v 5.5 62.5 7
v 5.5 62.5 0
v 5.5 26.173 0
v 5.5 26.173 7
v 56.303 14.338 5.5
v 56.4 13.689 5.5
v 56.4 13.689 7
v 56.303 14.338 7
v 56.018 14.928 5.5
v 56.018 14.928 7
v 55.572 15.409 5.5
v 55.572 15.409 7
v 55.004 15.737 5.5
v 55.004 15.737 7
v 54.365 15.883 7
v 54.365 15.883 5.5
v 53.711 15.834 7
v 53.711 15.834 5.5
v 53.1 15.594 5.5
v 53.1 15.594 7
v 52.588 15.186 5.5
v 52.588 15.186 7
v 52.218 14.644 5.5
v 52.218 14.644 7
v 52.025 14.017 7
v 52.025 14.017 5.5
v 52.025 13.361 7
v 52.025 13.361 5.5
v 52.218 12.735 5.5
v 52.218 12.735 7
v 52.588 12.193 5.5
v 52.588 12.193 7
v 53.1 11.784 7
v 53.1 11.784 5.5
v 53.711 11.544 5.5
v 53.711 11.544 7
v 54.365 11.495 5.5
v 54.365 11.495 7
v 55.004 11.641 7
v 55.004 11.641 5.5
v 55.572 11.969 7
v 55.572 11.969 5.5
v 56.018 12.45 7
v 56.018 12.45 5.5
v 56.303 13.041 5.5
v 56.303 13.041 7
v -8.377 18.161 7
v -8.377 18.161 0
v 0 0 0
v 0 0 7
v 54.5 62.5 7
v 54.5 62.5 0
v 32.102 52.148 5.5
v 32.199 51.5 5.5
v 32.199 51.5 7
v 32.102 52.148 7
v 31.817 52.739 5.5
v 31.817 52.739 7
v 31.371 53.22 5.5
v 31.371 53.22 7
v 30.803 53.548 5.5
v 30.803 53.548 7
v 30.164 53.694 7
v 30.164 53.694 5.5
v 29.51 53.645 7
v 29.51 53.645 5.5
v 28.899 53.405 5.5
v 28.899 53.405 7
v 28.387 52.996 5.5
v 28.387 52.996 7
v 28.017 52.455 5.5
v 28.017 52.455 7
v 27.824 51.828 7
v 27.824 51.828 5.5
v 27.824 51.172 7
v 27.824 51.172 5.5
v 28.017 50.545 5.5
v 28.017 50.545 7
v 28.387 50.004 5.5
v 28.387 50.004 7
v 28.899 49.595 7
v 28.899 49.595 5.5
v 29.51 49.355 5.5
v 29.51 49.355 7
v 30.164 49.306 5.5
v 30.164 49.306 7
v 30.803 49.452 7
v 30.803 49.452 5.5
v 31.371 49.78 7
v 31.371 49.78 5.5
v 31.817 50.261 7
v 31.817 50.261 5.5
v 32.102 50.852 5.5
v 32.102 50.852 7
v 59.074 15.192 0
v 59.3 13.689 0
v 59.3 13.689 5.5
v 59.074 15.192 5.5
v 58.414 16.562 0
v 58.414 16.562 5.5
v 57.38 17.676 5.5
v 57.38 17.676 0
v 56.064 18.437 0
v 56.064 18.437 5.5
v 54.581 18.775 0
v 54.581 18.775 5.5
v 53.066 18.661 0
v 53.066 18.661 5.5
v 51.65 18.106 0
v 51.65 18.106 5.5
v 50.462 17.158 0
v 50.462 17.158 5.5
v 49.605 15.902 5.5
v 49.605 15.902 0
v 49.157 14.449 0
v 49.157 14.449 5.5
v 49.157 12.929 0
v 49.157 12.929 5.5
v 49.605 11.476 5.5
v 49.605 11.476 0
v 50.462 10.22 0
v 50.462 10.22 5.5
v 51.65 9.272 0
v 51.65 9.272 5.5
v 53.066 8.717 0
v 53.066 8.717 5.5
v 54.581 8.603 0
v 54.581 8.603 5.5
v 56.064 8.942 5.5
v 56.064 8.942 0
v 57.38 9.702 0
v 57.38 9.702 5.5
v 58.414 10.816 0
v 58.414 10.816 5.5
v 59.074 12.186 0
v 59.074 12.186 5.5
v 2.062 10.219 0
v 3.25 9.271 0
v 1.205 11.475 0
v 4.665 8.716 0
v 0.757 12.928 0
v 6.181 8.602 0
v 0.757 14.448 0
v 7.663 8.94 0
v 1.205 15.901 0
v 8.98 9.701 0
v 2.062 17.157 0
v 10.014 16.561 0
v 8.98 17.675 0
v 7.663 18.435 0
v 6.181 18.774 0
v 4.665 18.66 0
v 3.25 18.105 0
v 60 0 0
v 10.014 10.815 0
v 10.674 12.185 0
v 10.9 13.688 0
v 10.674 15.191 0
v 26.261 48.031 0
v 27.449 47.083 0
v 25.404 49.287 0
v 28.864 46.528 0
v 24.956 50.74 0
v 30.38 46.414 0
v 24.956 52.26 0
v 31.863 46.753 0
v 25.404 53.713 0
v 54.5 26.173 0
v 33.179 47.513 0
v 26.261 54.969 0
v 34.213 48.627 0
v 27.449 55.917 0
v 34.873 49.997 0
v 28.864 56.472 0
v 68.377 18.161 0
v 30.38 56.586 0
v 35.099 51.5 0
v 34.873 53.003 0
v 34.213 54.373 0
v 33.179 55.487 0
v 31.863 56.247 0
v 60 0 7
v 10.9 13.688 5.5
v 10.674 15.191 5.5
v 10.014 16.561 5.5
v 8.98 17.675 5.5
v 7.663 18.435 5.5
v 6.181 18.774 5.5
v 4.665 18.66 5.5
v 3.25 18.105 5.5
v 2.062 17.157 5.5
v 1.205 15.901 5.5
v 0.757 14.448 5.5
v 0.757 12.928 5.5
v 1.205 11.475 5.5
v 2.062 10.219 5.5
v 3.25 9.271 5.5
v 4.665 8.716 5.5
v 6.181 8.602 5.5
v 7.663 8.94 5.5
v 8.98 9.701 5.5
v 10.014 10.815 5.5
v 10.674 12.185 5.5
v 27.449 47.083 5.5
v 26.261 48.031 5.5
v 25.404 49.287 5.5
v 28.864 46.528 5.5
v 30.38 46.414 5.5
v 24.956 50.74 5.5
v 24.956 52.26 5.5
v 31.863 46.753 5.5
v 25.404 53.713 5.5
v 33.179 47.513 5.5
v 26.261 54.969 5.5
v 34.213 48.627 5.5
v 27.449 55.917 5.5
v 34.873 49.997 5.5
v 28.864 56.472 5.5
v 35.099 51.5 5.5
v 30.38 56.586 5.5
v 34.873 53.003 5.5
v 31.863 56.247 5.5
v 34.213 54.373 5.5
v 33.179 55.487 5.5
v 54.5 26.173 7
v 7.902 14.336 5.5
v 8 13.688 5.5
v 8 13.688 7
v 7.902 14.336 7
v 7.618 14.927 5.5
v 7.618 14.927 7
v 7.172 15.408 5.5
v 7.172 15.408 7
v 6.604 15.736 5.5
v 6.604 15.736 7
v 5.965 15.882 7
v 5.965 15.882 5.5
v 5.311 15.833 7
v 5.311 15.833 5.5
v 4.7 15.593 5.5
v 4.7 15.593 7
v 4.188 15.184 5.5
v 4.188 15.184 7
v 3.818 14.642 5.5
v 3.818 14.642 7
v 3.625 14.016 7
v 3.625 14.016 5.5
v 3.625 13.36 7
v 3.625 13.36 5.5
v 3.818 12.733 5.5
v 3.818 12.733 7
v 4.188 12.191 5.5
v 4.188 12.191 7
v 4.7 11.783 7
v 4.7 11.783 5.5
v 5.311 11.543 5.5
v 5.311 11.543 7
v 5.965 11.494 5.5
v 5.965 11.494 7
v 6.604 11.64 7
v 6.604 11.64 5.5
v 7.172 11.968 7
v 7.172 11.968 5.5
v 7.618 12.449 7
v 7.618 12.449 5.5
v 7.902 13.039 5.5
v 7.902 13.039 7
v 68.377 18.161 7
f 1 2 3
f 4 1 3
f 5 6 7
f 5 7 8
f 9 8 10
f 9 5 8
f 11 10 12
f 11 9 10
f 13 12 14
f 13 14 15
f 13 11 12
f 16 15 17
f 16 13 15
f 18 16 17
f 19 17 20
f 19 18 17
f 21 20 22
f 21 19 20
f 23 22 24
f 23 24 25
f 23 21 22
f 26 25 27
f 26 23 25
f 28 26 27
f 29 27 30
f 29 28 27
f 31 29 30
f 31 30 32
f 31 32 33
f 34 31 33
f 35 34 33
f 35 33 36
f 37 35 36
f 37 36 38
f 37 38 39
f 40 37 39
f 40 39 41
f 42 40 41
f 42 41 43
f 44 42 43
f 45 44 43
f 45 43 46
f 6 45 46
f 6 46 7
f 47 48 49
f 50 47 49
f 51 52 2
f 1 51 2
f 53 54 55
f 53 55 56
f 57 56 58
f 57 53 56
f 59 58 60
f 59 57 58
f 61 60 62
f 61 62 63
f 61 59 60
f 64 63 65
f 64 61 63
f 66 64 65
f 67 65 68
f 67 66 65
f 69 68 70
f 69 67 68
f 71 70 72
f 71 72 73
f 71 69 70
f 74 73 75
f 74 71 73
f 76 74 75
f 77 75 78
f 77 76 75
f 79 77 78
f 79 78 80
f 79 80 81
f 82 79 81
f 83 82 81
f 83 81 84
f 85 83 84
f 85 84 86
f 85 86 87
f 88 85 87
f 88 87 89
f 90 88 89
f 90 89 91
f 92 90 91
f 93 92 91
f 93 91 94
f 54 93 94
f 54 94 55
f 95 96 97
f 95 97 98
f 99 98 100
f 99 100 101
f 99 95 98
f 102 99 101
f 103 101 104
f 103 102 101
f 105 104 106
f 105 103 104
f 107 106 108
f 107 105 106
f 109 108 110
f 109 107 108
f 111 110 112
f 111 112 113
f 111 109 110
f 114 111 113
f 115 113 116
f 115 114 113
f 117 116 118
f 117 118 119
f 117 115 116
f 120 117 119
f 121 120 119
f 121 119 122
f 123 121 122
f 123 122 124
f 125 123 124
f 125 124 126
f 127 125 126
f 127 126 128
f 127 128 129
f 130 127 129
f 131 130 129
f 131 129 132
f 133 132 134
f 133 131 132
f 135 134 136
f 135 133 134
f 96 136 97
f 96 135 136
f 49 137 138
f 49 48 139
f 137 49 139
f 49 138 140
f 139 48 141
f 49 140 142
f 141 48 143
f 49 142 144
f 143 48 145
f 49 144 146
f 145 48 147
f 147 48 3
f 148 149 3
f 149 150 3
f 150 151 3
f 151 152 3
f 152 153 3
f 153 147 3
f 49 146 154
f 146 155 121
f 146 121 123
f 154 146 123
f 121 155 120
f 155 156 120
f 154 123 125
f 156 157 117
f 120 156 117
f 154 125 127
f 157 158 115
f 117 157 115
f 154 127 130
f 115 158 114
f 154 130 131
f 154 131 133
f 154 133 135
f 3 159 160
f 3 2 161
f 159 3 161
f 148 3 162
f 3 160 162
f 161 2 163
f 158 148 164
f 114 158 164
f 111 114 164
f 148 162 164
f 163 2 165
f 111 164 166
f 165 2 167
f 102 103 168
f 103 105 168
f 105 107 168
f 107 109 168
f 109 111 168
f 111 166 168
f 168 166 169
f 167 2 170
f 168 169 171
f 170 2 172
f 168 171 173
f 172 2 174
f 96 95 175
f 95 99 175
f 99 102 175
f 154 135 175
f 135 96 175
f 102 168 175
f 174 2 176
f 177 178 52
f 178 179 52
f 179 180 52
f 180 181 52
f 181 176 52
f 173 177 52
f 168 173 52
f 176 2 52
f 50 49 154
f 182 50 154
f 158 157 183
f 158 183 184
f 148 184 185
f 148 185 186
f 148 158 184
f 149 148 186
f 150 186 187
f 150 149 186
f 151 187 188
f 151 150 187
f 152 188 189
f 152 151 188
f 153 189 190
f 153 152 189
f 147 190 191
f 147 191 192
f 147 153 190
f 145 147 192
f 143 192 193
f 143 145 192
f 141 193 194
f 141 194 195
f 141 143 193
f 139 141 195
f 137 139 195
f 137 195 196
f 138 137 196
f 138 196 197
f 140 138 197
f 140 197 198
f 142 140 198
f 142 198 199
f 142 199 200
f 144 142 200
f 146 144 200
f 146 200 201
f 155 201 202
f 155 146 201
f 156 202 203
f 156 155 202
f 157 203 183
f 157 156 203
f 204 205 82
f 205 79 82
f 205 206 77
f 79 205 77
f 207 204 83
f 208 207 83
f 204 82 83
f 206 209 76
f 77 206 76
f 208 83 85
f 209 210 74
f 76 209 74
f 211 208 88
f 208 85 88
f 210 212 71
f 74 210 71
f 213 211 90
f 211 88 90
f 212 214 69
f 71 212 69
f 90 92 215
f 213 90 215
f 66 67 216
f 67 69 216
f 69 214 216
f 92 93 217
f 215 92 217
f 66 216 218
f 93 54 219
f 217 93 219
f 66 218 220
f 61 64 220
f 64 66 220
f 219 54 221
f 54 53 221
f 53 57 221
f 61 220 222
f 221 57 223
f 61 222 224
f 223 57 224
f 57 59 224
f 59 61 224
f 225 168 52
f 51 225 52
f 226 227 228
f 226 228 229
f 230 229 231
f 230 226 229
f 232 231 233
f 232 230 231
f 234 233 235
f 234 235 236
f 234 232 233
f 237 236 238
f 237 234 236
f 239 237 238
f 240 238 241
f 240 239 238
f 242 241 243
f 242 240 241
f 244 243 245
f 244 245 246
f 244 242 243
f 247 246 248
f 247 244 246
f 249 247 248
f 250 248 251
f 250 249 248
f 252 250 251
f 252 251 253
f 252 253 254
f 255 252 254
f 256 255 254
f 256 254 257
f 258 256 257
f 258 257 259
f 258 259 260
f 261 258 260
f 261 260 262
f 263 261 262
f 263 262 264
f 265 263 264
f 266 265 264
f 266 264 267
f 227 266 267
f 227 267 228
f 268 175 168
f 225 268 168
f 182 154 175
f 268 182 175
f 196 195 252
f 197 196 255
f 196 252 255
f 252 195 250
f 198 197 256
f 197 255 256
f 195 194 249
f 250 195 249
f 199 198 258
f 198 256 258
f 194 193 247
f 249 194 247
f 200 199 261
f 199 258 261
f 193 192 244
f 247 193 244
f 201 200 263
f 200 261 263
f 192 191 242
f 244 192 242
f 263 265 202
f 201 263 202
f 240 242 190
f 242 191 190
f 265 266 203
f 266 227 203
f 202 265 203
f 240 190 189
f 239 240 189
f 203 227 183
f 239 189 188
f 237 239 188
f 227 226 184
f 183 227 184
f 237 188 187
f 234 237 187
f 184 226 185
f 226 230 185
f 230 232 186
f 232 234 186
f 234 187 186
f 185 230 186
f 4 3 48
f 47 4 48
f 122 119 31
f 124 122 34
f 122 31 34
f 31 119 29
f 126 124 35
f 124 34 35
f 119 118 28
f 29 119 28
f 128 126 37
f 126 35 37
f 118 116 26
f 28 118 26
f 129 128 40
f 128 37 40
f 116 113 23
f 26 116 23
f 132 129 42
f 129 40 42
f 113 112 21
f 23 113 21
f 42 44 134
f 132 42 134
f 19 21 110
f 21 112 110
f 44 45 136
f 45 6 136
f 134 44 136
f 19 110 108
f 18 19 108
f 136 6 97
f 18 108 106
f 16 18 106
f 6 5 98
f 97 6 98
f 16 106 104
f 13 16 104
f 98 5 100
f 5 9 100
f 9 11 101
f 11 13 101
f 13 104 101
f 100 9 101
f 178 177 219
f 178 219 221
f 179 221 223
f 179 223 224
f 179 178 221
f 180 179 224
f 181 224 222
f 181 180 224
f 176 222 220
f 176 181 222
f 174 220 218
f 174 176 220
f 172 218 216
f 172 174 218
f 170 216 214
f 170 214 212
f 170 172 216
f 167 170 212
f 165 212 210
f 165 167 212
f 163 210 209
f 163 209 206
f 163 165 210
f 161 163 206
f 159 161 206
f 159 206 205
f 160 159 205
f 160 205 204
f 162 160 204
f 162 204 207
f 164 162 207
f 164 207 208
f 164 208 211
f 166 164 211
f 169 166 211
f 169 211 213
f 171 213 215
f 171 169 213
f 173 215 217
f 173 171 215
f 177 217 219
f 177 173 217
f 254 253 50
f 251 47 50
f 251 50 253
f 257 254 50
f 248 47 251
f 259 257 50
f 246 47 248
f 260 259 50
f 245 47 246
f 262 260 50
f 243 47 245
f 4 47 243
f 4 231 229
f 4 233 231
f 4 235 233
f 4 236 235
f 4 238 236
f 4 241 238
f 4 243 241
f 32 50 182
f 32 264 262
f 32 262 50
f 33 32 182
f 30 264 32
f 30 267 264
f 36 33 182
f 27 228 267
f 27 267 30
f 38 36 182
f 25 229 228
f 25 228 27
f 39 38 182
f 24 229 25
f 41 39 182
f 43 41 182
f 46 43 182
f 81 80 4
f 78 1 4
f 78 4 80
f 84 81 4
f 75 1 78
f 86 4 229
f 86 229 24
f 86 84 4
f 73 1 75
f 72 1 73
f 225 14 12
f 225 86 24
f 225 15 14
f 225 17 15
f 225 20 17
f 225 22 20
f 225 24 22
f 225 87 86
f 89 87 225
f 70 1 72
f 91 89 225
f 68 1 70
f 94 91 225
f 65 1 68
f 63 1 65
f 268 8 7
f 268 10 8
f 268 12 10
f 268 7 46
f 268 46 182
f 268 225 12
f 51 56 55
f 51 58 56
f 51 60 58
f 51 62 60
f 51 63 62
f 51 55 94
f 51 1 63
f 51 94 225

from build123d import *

# Parameters (mm, degrees)
SKETCH1_R           = 5.1
SKETCH1_R_2         = 2.2
BOSS_EXTRUDE1_DEPTH = 7
SKETCH1_3_R         = 5.1
SKETCH1_3_R_2       = 2.2
CUT_EXTRUDE1_DEPTH  = 5.5
SKETCH1_4_R         = 2.2
CUT_EXTRUDE2_DEPTH  = 7


with BuildPart() as part:
    # Sketch1 → Boss-Extrude1 (new body)
    with BuildSketch(Plane.XY):
        Polygon((54.5, 26.172980381), (54.5, 62.5), (5.5, 62.5), (5.5, 26.172980381), (-8.376844495, 18.161180477), (0, 0), (60, 0), (68.376844495, 18.161180477), align=None)
        with Locations((29.999295859, 51.499999991)):
            Circle(SKETCH1_R, mode=Mode.SUBTRACT)
        with Locations((5.800227015, 13.687854711)):
            Circle(SKETCH1_R, mode=Mode.SUBTRACT)
        with Locations((54.200362799, 13.689133529)):
            Circle(SKETCH1_R, mode=Mode.SUBTRACT)
        with Locations((5.800227015, 13.687854711)):
            Circle(SKETCH1_R)
        with Locations((5.800227015, 13.687854711)):
            Circle(SKETCH1_R_2, mode=Mode.SUBTRACT)
        with Locations((5.800227015, 13.687854711)):
            Circle(SKETCH1_R_2)
        with Locations((54.200362799, 13.689133529)):
            Circle(SKETCH1_R)
        with Locations((54.200362799, 13.689133529)):
            Circle(SKETCH1_R_2, mode=Mode.SUBTRACT)
        with Locations((54.200362799, 13.689133529)):
            Circle(SKETCH1_R_2)
        with Locations((29.999295859, 51.499999991)):
            Circle(SKETCH1_R)
        with Locations((29.999295859, 51.499999991)):
            Circle(SKETCH1_R_2, mode=Mode.SUBTRACT)
        with Locations((29.999295859, 51.499999991)):
            Circle(SKETCH1_R_2)
    extrude(amount=BOSS_EXTRUDE1_DEPTH)

    # Sketch1<3> → Cut-Extrude1 (cut)
    with BuildSketch(Plane.XY):
        with Locations((29.999295859, 51.499999991)):
            Circle(SKETCH1_3_R)
        with Locations((29.999295859, 51.499999991)):
            Circle(SKETCH1_3_R_2, mode=Mode.SUBTRACT)
        with Locations((54.200362799, 13.689133529)):
            Circle(SKETCH1_3_R)
        with Locations((54.200362799, 13.689133529)):
            Circle(SKETCH1_3_R_2, mode=Mode.SUBTRACT)
        with Locations((5.800227015, 13.687854711)):
            Circle(SKETCH1_3_R)
        with Locations((5.800227015, 13.687854711)):
            Circle(SKETCH1_3_R_2, mode=Mode.SUBTRACT)
    extrude(amount=CUT_EXTRUDE1_DEPTH, mode=Mode.SUBTRACT)

    # Sketch1<4> → Cut-Extrude2 (cut)
    with BuildSketch(Plane.XY):
        with Locations((54.200362799, 13.689133529)):
            Circle(SKETCH1_4_R)
        with Locations((5.800227015, 13.687854711)):
            Circle(SKETCH1_4_R)
        with Locations((29.999295859, 51.499999991)):
            Circle(SKETCH1_4_R)
    extrude(amount=CUT_EXTRUDE2_DEPTH, mode=Mode.SUBTRACT)


solid = part.part
